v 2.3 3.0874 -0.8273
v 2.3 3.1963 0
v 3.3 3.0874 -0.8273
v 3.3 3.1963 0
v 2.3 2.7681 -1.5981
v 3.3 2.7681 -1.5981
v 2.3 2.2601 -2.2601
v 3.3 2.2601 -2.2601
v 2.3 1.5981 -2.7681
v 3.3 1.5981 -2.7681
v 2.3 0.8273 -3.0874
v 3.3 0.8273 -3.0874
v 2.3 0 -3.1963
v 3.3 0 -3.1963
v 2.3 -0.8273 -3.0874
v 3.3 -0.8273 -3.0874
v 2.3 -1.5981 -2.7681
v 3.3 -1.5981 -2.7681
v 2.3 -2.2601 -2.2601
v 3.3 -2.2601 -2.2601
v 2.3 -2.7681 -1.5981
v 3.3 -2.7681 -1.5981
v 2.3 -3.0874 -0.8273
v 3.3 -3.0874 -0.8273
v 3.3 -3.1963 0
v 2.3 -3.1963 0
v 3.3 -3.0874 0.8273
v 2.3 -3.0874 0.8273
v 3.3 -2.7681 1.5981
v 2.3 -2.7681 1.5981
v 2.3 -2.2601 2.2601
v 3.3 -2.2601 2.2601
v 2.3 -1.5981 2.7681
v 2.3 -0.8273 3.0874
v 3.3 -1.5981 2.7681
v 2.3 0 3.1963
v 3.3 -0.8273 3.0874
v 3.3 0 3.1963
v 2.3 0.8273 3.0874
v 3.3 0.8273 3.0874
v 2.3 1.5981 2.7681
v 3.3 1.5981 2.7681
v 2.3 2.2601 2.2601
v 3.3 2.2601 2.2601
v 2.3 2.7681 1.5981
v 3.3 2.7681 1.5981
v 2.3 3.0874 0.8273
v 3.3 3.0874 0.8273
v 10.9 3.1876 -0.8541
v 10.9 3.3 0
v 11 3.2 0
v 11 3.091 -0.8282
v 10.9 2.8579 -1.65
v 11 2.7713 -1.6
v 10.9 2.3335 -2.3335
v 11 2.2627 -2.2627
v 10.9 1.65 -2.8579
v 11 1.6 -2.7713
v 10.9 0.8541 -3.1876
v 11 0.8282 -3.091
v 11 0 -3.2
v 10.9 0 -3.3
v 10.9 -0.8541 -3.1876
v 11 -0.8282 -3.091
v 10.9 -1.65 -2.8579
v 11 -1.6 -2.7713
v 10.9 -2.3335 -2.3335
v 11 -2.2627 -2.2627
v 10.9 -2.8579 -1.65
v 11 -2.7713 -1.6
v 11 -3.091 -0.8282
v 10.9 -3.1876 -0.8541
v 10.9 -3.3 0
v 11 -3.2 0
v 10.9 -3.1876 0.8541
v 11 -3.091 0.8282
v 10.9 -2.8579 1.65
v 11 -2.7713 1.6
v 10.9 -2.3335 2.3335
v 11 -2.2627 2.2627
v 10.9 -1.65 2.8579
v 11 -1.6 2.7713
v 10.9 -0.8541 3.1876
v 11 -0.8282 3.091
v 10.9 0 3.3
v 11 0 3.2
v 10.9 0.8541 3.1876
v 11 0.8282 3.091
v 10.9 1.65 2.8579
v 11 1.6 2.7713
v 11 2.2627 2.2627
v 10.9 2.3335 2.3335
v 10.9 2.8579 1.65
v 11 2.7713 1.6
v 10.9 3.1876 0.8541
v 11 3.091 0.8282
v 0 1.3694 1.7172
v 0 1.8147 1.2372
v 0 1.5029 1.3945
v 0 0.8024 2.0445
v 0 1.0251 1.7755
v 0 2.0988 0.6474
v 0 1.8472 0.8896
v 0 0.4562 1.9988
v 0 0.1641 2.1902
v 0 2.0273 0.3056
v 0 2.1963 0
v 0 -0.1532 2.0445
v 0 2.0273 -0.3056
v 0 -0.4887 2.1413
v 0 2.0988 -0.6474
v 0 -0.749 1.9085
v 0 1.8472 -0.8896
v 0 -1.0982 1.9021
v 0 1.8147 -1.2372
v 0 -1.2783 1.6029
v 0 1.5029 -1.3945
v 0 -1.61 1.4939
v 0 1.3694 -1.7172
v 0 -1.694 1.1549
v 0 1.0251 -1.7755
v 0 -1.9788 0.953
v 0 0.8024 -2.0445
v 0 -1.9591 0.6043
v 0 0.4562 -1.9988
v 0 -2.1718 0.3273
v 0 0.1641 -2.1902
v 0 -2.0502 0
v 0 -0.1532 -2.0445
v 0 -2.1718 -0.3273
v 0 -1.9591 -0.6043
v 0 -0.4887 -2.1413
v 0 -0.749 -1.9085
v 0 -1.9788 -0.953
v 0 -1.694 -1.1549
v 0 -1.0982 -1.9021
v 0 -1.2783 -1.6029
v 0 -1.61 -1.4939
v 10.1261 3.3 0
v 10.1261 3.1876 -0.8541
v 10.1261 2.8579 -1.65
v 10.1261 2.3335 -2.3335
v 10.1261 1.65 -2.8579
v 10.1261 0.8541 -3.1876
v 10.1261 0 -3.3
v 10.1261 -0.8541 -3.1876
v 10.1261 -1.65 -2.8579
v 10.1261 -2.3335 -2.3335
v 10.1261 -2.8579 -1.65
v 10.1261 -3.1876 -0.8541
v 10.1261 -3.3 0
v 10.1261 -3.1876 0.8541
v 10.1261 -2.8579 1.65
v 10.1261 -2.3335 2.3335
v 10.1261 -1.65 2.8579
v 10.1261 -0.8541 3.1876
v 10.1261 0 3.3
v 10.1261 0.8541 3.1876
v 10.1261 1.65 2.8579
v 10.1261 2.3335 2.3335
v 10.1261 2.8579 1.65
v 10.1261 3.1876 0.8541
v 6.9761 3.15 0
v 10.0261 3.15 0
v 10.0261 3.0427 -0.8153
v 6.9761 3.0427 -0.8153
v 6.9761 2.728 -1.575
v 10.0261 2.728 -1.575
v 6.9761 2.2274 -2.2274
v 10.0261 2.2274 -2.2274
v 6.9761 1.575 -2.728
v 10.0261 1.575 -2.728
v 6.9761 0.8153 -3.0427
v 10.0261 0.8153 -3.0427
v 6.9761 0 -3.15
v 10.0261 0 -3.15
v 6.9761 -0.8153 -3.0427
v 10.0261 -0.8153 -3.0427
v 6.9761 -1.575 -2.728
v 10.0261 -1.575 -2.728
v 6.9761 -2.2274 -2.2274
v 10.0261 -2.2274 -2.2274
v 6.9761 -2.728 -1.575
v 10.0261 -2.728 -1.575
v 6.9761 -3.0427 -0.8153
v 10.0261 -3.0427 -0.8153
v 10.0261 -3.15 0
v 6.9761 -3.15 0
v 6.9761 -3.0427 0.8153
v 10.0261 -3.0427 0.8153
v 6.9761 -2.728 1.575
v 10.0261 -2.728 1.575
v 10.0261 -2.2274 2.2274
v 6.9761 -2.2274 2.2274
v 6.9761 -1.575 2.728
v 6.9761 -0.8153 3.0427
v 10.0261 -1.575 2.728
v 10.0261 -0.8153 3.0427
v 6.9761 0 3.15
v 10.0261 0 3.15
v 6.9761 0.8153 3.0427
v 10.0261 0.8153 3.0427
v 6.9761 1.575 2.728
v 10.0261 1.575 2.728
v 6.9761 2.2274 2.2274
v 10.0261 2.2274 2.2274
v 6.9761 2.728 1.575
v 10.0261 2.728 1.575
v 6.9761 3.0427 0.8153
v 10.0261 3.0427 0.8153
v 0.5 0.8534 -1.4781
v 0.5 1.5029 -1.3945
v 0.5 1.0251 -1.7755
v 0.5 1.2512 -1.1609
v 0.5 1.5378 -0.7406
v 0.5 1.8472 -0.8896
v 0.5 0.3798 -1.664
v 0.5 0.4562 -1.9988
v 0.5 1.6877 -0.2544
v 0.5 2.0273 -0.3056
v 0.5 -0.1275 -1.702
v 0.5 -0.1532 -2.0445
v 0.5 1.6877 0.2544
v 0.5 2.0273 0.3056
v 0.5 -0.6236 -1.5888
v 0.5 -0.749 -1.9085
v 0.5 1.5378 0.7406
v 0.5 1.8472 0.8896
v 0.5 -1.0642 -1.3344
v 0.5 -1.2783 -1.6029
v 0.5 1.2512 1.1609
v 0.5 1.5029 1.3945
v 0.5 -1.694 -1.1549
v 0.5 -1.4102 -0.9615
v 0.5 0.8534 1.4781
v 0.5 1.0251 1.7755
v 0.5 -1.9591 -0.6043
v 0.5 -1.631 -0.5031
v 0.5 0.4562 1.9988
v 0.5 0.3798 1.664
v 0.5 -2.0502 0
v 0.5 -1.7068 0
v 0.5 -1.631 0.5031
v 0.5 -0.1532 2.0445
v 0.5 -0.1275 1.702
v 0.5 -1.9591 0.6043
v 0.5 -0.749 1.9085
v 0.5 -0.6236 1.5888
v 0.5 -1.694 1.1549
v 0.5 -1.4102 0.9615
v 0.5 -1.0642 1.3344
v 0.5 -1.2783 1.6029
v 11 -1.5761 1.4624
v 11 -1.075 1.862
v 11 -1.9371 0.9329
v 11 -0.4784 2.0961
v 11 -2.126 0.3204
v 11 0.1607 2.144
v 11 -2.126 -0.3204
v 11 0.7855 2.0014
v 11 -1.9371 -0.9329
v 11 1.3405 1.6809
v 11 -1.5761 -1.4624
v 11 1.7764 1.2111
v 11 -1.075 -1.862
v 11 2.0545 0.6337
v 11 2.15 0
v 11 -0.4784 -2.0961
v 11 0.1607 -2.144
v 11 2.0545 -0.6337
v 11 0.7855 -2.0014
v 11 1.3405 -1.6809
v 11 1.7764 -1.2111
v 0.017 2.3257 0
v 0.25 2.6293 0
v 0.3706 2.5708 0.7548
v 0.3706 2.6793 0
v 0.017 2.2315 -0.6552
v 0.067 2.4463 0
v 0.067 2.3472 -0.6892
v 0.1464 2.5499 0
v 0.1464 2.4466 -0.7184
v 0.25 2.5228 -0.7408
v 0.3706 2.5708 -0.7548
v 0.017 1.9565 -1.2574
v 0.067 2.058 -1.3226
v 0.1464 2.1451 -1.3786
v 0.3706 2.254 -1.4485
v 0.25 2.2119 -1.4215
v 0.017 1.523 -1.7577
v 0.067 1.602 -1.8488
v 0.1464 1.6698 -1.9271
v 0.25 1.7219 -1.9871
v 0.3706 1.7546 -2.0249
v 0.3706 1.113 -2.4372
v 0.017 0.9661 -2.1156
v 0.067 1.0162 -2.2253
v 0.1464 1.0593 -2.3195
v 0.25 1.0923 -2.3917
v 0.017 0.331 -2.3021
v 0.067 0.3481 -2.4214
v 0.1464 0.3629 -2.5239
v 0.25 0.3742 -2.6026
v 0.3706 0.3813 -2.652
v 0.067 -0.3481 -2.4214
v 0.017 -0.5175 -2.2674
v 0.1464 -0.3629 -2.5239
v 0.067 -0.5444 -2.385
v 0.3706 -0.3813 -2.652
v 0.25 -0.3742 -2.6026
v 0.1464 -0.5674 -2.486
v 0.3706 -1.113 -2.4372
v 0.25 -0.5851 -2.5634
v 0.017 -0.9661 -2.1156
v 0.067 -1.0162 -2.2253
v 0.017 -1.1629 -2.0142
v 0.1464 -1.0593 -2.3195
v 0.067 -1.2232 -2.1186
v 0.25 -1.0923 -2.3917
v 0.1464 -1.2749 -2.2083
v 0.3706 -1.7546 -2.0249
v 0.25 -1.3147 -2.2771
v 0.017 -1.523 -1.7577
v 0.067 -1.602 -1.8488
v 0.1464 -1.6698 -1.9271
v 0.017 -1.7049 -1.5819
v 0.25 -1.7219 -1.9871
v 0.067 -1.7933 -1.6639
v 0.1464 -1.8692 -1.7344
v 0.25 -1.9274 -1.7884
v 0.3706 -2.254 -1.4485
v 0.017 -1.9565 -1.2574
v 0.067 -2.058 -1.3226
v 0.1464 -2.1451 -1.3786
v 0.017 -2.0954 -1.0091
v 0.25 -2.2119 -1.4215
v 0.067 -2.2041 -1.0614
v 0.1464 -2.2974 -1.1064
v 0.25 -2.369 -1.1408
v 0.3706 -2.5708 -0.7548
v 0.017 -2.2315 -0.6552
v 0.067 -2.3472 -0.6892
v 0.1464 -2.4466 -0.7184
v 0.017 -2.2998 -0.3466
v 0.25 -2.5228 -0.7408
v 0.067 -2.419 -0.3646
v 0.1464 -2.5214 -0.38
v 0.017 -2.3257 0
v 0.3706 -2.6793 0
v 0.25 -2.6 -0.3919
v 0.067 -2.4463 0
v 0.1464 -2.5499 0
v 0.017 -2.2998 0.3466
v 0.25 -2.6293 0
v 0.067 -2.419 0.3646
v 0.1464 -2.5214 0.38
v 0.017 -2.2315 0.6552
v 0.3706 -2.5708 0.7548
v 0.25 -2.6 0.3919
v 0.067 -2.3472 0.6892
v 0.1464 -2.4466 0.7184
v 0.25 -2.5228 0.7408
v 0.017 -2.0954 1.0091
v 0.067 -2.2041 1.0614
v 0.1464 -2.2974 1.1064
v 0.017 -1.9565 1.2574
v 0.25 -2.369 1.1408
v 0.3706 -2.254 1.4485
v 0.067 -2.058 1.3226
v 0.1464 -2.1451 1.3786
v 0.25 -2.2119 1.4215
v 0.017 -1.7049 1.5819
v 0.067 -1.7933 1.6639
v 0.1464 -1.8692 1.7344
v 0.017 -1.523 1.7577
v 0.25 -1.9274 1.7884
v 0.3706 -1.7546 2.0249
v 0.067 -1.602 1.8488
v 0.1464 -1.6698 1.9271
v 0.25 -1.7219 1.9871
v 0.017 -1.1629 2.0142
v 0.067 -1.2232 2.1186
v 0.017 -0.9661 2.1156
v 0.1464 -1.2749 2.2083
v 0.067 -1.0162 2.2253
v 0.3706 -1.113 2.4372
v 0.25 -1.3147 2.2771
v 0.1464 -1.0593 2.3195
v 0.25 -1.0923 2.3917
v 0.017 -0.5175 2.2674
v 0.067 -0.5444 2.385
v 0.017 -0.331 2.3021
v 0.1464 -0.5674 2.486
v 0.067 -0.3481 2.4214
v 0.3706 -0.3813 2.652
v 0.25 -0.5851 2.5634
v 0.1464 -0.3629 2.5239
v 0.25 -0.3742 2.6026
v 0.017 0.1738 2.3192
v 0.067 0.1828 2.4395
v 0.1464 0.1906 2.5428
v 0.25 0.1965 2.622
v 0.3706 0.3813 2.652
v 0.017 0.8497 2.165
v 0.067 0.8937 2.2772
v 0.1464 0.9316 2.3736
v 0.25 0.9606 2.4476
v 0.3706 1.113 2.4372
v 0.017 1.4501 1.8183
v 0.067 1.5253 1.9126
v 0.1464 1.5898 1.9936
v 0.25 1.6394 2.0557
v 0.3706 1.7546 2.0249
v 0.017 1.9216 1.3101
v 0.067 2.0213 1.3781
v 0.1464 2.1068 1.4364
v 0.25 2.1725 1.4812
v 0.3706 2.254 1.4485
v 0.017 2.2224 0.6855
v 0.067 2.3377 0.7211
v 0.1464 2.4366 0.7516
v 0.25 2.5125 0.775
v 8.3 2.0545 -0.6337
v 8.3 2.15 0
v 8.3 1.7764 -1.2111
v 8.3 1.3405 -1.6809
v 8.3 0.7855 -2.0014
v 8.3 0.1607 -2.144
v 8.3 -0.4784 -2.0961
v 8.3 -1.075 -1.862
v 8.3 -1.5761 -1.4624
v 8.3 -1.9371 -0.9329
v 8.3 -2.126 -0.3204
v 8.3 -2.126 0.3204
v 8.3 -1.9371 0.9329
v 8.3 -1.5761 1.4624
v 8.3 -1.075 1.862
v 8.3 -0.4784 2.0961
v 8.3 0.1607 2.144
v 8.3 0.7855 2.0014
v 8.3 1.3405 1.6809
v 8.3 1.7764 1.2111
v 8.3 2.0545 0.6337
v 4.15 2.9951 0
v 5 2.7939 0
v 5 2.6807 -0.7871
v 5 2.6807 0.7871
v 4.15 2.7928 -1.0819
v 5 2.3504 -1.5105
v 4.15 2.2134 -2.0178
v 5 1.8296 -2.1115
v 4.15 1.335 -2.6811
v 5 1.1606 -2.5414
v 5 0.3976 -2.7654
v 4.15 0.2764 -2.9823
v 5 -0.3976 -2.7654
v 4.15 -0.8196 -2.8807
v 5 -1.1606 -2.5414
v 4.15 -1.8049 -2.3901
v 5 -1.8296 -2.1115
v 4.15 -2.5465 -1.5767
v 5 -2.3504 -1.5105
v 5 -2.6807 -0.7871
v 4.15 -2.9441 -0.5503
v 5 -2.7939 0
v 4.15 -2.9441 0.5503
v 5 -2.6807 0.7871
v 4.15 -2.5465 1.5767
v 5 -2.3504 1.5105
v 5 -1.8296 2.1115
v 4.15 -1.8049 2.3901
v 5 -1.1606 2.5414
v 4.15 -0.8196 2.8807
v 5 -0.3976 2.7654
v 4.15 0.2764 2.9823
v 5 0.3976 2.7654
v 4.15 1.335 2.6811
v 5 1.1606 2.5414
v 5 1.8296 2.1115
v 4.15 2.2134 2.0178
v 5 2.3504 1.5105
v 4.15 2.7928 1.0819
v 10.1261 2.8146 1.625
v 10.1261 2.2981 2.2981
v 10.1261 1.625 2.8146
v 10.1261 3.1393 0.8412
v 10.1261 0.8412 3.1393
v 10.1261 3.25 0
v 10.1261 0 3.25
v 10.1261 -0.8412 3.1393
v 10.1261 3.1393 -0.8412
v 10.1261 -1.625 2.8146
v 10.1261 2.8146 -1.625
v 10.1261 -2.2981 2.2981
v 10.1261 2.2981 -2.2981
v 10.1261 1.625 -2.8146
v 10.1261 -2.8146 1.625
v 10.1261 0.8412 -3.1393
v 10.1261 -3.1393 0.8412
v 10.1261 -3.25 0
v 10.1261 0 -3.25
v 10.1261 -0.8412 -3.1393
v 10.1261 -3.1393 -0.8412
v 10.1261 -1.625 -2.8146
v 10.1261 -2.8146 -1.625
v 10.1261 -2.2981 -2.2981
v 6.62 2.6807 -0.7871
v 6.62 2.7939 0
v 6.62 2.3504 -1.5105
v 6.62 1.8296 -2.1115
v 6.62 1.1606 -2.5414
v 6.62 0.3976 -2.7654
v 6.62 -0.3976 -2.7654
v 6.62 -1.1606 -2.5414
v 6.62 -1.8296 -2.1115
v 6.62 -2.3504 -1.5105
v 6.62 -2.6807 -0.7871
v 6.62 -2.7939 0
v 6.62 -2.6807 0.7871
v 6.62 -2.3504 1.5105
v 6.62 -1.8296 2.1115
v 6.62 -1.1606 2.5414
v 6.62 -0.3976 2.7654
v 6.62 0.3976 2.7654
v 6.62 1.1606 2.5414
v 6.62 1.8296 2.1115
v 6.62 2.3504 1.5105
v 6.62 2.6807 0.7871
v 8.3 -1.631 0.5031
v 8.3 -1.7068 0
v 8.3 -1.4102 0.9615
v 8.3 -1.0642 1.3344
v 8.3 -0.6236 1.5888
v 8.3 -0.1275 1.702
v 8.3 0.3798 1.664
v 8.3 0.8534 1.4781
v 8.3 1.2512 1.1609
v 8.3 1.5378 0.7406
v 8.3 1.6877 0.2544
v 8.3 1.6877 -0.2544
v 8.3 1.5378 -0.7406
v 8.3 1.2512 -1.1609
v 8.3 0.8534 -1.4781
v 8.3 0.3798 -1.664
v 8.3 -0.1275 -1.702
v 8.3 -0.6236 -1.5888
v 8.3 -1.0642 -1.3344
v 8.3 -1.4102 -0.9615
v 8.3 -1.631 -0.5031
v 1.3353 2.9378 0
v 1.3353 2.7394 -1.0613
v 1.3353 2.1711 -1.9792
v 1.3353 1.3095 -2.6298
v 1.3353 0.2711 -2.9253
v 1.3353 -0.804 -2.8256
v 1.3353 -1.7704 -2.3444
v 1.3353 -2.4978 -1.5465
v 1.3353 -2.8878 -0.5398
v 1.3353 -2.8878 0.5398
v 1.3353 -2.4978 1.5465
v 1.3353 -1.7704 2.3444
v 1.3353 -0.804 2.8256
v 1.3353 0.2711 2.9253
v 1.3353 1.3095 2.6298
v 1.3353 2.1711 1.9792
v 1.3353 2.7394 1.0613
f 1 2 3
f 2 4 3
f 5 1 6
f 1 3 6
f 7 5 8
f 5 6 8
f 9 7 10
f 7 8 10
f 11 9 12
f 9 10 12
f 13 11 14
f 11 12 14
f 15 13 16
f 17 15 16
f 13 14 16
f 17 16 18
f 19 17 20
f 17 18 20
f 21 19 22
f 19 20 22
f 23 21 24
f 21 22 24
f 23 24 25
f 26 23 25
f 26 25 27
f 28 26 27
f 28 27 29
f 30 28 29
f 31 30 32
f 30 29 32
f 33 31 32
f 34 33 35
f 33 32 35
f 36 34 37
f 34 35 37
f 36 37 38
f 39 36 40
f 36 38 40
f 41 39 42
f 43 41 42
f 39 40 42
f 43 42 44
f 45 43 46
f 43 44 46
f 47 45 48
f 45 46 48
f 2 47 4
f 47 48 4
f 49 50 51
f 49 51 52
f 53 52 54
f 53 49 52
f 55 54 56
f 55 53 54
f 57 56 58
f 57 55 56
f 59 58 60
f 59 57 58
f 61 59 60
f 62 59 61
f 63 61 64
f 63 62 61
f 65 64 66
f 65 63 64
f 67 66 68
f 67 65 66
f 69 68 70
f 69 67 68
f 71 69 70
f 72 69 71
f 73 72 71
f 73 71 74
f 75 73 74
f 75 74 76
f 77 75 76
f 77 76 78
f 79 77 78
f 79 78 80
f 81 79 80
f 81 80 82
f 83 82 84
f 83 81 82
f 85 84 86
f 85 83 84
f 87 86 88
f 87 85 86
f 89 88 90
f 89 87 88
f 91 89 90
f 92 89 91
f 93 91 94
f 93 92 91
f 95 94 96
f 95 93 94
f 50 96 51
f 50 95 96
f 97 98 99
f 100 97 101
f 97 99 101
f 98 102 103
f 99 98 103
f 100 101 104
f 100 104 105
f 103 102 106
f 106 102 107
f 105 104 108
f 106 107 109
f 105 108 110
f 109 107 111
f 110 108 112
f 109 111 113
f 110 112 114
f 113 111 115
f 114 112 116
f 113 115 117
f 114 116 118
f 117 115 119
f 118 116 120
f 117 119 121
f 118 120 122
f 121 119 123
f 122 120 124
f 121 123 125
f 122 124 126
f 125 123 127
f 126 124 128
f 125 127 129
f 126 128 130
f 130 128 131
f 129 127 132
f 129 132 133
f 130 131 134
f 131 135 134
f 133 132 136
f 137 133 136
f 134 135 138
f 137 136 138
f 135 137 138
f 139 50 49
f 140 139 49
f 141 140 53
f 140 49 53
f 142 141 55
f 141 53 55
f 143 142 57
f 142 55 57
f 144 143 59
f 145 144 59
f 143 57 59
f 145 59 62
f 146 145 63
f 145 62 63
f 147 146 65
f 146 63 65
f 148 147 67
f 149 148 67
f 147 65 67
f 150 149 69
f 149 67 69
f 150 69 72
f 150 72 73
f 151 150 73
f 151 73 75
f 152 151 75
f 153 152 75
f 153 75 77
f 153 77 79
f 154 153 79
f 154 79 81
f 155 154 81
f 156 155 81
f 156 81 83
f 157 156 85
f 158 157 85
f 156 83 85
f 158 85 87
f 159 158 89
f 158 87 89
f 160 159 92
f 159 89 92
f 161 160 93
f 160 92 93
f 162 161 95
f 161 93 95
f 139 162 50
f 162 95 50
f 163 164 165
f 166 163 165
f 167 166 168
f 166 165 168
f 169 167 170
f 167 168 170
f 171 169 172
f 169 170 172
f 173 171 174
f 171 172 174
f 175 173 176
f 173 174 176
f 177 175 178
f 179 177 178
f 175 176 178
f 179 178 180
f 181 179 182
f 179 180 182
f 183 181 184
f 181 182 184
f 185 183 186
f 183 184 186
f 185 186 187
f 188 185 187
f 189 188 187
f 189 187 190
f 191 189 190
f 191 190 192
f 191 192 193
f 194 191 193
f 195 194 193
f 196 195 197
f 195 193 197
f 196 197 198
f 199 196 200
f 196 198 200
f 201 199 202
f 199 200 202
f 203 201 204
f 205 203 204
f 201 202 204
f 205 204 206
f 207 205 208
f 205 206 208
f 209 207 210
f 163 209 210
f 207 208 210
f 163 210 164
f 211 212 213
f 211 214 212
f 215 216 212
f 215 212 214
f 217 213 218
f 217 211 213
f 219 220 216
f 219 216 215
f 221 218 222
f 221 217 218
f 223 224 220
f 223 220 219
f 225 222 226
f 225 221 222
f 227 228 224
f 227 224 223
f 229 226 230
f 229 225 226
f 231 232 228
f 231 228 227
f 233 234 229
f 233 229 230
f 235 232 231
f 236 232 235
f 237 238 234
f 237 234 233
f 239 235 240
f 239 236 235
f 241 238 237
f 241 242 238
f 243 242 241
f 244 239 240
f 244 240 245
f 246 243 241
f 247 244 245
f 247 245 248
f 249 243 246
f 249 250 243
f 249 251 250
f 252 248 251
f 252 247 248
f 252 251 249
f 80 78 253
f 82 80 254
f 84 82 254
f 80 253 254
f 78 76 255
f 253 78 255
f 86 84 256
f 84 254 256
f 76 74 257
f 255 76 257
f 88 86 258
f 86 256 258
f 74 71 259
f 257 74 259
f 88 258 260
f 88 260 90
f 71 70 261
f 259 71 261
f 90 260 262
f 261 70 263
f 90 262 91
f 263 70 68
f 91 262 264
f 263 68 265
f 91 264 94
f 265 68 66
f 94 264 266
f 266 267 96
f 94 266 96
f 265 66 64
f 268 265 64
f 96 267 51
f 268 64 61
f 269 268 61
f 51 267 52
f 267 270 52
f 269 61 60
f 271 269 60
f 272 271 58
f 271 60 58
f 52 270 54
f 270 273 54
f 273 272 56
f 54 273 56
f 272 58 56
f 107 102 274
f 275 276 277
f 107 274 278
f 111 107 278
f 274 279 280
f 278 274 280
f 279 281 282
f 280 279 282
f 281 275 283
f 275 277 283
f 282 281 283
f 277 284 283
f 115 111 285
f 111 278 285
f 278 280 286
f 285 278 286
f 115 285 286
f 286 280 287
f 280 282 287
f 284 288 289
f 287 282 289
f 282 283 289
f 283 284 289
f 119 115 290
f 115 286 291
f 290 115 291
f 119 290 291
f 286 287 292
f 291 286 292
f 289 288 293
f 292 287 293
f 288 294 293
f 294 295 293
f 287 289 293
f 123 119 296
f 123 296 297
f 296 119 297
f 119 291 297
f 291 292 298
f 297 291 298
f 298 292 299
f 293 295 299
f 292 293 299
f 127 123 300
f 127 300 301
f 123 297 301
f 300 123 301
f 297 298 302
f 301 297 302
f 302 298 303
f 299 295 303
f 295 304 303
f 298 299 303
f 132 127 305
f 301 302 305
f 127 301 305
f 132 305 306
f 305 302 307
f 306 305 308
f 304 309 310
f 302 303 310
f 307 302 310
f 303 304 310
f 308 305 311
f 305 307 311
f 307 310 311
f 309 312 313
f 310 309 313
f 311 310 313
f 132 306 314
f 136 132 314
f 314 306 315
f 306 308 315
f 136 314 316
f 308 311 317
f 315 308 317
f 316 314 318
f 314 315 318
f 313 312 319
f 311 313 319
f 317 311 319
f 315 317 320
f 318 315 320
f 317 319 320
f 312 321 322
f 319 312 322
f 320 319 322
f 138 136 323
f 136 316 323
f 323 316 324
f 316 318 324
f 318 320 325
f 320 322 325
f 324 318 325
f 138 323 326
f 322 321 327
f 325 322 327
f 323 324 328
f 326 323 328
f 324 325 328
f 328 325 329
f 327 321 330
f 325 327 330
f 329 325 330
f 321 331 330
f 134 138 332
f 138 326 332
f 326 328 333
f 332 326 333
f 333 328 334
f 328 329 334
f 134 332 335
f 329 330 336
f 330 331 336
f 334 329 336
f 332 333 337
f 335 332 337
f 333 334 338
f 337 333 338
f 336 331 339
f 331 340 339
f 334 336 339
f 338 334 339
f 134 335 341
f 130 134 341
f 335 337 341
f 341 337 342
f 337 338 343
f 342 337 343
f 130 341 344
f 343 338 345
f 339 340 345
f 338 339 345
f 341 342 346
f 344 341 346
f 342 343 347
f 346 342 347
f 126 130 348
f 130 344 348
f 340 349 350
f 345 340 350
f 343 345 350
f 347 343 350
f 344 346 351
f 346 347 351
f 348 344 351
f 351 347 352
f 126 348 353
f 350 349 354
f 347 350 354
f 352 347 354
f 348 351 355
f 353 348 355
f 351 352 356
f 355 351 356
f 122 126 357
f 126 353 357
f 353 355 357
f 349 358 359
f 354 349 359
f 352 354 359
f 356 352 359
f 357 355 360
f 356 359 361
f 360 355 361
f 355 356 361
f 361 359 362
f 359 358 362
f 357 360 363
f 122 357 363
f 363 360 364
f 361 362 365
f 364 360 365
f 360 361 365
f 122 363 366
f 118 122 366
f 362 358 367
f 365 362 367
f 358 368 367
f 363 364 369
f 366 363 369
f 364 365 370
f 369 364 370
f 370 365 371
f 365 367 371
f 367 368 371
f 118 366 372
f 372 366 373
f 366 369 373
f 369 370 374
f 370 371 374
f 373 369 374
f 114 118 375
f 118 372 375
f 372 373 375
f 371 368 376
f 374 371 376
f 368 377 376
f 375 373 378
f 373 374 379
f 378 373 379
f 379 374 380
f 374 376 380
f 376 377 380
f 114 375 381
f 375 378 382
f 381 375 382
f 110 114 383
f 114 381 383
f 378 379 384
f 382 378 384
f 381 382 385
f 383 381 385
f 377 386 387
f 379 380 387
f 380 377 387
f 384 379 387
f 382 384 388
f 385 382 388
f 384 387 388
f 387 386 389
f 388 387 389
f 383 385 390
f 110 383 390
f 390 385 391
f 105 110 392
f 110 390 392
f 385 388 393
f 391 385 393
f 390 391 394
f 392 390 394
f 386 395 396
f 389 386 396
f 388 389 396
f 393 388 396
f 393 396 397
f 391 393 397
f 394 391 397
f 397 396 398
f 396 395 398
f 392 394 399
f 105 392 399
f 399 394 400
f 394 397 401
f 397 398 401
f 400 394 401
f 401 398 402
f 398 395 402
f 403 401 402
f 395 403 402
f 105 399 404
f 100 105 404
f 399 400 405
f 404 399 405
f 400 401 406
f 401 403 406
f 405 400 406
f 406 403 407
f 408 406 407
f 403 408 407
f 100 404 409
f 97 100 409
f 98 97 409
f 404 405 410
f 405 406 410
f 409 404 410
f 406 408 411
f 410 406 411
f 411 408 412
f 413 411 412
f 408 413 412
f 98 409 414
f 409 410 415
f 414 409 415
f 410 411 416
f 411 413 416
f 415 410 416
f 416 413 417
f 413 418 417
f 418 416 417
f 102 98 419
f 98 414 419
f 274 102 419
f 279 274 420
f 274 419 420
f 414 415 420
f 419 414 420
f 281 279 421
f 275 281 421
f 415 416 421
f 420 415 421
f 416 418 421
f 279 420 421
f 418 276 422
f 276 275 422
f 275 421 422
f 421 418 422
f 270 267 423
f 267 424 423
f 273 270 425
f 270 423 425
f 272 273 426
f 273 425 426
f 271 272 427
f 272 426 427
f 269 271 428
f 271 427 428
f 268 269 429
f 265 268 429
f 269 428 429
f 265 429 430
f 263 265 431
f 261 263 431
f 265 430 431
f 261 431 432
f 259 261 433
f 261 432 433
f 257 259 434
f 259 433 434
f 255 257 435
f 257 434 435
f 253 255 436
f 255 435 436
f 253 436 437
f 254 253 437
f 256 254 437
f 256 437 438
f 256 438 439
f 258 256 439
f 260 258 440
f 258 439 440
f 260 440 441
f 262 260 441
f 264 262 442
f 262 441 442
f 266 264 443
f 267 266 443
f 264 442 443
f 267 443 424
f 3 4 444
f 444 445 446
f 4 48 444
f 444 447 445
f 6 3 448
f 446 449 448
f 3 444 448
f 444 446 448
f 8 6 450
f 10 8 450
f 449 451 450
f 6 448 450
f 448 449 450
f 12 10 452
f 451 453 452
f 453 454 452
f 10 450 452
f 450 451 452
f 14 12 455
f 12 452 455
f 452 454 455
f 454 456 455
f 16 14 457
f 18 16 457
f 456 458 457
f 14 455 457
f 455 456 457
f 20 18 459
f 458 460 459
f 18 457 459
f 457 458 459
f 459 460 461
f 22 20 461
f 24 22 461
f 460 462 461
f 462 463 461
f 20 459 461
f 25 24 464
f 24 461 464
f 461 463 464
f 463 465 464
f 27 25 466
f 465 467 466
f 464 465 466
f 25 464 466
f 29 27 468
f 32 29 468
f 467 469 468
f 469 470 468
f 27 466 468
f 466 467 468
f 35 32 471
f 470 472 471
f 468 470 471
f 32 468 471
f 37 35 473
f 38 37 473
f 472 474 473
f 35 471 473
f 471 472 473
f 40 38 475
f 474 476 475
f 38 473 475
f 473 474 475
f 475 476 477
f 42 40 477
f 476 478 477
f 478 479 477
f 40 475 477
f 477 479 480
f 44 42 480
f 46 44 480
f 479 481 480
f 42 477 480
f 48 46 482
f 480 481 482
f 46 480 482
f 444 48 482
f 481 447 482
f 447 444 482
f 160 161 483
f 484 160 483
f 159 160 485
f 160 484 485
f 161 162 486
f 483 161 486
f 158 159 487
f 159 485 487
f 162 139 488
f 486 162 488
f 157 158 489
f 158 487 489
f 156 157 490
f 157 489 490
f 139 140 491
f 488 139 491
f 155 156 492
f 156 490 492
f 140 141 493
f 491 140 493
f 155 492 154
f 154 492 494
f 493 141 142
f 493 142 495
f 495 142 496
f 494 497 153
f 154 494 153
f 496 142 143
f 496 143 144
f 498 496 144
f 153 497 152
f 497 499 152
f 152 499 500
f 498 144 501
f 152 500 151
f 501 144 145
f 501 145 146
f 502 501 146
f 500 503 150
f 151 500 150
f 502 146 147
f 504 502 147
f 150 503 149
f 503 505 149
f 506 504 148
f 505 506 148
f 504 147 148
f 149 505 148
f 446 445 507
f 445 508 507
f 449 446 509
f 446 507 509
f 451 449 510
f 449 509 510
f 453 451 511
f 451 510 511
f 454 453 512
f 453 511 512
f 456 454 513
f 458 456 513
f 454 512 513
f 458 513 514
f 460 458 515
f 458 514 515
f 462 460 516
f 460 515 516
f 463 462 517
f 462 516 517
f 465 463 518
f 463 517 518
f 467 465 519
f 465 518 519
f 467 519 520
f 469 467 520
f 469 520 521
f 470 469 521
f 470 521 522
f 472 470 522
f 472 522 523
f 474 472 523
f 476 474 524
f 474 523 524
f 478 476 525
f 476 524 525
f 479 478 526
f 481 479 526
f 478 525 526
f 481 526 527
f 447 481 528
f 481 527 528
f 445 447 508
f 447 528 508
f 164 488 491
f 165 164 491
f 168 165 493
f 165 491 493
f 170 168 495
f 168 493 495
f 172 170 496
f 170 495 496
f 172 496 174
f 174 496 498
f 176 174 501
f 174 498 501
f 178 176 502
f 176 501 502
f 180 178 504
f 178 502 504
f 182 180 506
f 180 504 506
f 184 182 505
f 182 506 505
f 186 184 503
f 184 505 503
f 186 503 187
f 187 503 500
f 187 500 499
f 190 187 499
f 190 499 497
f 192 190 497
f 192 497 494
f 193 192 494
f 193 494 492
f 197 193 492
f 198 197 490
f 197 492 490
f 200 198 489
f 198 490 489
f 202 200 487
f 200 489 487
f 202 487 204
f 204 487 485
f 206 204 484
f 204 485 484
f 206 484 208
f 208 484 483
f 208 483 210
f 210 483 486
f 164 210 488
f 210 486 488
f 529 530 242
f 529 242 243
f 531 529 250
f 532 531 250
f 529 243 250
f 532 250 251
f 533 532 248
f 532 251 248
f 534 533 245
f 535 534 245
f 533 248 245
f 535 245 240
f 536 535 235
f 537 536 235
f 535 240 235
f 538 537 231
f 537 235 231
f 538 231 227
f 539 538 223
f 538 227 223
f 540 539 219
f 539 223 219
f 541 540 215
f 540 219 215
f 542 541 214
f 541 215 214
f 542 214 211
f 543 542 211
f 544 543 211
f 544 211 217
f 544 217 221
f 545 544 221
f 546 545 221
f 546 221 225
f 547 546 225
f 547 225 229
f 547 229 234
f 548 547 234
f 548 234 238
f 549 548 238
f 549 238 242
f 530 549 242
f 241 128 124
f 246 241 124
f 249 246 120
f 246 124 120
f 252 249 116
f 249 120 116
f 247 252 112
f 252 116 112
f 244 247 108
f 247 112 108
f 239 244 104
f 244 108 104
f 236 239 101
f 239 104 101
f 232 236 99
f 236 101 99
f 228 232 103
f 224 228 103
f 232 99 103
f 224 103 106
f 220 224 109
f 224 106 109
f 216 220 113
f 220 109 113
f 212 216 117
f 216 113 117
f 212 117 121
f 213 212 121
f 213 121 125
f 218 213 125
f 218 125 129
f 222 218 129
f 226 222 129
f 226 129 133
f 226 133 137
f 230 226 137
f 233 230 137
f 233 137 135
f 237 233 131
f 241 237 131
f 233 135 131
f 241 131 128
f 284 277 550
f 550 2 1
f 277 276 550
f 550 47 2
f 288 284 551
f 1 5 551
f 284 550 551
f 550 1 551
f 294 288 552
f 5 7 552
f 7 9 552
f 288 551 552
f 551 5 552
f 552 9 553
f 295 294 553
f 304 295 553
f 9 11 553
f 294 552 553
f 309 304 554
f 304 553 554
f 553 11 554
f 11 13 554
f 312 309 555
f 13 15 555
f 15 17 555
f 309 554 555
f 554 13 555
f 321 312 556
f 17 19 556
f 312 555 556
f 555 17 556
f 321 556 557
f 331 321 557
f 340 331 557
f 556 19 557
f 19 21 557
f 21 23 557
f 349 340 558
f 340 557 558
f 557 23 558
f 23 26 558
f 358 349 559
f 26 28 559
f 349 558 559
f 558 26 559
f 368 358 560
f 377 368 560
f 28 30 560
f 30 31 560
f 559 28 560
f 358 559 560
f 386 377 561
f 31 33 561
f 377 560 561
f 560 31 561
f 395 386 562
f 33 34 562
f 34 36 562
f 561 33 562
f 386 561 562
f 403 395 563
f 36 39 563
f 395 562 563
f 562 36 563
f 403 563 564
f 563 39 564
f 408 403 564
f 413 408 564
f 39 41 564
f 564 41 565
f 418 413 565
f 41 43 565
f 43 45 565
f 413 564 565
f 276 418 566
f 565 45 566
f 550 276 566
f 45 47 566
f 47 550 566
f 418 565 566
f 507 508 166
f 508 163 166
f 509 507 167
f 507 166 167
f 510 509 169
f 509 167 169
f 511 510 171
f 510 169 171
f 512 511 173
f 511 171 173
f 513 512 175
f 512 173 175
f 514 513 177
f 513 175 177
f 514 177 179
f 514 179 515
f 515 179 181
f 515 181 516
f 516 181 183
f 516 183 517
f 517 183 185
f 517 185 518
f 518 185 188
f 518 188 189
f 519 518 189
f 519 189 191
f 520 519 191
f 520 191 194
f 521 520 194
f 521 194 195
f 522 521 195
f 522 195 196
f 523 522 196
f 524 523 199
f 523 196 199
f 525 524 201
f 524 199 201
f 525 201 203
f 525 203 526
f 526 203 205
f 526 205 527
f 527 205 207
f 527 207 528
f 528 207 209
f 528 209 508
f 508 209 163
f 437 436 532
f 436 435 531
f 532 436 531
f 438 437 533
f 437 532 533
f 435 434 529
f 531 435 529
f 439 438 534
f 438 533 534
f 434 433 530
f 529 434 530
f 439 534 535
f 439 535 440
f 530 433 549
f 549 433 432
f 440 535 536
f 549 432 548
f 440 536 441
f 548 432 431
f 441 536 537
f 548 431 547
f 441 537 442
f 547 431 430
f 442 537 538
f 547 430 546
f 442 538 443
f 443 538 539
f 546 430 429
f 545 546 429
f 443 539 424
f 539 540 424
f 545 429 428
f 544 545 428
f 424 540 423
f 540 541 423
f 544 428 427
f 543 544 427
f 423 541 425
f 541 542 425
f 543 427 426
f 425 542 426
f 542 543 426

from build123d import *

# Parameters (mm, degrees)
SKETCH3_R          = 1.706794341
CUT_EXTRUDE1_DEPTH = 10
SKETCH4_R          = 2.050203782
CUT_EXTRUDE2_DEPTH = 0.5
FILLET1_R          = 0.5
CHAMFER1_SIZE      = 0.1


with BuildPart() as part:
    # Sketch1 → Revolve1 (revolve)
    with BuildSketch(Plane.XY):
        Polygon((0, 0), (0, 2.58), (2.3, 3.196283143), (3.3, 3.196283143), (5, 2.793868124), (6.62, 2.793868124), (6.976131876, 3.15), (10.126131876, 3.15), (10.126131876, 3.3), (11, 3.3), (11, 2.15), (8.3, 2.15), (8.3, 0), align=None)
    revolve(axis=Axis((8.3, 0, 0), (-1, 0, 0)))

    # Sketch3 → Cut-Extrude1 (cut)
    with BuildSketch(Plane.ZY):
        with Locations(Location((0, 0, 0), (0, 0, 270))):
            Circle(SKETCH3_R)
    extrude(amount=-CUT_EXTRUDE1_DEPTH, mode=Mode.SUBTRACT)

    # Sketch4 → Cut-Extrude2 (cut)
    with BuildSketch(Plane.ZY):
        with Locations(Location((0, 0, 0), (0, 0, 270))):
            Circle(SKETCH4_R)
    extrude(amount=-CUT_EXTRUDE2_DEPTH, mode=Mode.SUBTRACT)

    # Fillet1
    fillet1_edges = [part.edges().sort_by_distance(p)[0] for p in [
        (0, -2.58, 0),
    ]]
    fillet(fillet1_edges, radius=FILLET1_R)

    # Chamfer1
    chamfer1_edges = [part.edges().sort_by_distance(p)[0] for p in [
        (11, -3.3, 0),
        (10.126131876, -3.15, 0),
    ]]
    chamfer(chamfer1_edges, length=CHAMFER1_SIZE)


solid = part.part
